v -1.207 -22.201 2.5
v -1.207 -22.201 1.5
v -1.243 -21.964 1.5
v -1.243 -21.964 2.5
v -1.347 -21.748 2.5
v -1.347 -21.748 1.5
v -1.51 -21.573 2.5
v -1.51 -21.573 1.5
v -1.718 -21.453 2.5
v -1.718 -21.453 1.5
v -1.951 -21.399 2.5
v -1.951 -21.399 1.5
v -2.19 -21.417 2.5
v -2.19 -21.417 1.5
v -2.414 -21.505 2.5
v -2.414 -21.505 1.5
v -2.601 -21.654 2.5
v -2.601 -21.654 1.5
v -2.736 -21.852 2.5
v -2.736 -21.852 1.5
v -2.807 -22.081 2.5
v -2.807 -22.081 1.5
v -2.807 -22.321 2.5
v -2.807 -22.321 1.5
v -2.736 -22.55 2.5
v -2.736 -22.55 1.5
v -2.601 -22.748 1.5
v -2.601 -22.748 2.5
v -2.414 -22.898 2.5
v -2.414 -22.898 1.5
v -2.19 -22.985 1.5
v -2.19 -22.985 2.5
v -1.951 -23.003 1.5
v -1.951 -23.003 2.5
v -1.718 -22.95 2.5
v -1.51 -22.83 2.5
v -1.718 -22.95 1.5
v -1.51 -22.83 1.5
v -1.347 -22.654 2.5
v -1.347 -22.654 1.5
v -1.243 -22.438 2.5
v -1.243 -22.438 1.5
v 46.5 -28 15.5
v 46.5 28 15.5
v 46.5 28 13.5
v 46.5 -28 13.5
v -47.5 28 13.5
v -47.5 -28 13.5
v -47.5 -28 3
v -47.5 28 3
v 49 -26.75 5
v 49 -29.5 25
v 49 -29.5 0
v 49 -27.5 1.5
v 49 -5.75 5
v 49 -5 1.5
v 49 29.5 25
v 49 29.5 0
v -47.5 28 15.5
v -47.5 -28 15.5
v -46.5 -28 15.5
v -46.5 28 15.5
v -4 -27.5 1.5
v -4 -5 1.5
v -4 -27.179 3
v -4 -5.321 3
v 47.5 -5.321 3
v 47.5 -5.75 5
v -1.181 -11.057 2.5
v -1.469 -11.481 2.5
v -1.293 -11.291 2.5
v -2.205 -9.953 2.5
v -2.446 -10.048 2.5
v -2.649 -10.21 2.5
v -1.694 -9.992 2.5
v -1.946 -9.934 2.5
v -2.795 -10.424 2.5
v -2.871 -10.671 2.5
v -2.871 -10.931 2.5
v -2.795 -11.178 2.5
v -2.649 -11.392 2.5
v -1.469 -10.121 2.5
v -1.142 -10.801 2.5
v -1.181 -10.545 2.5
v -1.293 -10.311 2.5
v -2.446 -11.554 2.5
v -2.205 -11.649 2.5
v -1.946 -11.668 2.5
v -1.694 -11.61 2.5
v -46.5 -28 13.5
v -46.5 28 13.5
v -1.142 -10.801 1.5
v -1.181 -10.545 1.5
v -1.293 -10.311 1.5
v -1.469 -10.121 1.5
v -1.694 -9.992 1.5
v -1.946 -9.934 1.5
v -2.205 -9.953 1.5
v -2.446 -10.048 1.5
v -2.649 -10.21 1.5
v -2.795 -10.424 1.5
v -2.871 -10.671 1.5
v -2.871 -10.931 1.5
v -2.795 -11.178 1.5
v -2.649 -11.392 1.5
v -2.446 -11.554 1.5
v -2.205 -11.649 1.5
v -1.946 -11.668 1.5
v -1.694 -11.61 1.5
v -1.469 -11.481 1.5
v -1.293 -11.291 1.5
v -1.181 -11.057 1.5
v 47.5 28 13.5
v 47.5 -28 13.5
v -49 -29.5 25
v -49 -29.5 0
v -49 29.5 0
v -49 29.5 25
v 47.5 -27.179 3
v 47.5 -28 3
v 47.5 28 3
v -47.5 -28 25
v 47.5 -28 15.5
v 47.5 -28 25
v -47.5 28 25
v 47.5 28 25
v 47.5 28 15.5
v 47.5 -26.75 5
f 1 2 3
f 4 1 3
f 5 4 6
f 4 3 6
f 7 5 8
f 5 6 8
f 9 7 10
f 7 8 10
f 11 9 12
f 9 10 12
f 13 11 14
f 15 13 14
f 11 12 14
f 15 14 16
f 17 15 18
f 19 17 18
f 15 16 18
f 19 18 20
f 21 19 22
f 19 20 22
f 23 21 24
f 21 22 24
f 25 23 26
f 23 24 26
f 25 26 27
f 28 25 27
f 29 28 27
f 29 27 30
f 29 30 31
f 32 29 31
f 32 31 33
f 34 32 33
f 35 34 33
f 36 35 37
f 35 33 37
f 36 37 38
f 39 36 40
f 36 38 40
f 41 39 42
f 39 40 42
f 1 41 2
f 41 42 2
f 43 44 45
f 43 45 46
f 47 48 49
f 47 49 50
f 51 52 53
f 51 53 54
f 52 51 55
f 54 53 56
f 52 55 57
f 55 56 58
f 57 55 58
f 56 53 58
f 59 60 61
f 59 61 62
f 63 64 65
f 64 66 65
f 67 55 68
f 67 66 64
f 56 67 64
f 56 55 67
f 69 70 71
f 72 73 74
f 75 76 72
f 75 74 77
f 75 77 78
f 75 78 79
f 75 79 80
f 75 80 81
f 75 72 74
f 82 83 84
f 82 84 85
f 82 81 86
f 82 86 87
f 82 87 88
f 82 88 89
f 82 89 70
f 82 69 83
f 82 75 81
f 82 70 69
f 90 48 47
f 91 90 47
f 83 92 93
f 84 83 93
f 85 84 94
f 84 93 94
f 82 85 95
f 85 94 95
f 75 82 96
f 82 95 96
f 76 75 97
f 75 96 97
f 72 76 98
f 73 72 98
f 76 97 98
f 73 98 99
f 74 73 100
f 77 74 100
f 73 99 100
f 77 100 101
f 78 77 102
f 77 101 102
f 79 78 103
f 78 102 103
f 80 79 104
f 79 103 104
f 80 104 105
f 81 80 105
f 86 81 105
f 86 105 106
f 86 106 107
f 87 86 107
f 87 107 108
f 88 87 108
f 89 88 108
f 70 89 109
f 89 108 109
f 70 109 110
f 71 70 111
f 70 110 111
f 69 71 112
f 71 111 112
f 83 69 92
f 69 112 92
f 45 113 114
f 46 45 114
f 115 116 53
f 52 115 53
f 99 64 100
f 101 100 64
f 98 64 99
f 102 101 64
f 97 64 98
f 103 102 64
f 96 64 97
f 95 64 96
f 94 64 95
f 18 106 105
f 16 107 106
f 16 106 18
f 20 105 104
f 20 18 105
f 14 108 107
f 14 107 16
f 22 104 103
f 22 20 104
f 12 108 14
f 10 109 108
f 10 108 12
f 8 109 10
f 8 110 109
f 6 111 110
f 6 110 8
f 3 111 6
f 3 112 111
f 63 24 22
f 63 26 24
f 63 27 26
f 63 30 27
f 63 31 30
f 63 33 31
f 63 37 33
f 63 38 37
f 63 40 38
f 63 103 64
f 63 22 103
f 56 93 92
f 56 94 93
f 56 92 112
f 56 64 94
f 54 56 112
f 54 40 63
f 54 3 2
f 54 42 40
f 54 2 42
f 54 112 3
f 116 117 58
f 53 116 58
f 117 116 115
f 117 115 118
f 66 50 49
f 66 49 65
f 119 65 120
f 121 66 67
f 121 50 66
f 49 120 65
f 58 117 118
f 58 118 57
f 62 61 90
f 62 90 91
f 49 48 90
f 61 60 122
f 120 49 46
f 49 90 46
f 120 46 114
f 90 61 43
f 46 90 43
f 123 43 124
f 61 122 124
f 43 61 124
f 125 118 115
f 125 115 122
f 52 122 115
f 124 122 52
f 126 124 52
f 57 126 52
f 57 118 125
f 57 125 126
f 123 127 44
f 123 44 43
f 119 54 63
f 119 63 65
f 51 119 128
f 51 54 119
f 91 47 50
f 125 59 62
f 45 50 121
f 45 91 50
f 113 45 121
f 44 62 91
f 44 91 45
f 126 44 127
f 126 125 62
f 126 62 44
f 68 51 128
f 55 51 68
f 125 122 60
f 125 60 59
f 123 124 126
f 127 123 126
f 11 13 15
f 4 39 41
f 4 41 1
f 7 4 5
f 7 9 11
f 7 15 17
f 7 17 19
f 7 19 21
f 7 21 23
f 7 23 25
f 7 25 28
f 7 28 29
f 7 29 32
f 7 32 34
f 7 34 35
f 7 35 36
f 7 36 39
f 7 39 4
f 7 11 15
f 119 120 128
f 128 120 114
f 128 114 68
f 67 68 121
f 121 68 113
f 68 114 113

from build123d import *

# Parameters (mm, degrees)
SKETCH010_W     = 98
SKETCH010_H     = 59
PAD007_DEPTH    = 25
SKETCH011_W     = 95
SKETCH011_H     = 56
POCKET002_DEPTH = 22
SKETCH012_W     = 56
SKETCH012_H     = 2
PAD008_DEPTH    = 1
SKETCH013_W     = 56.025157
SKETCH013_H     = 2
PAD009_DEPTH    = 1
POCKET003_DEPTH = 53
SKETCH017_R     = 0.869454
SKETCH017_R_2   = 0.804164
PAD010_DEPTH    = 1


with BuildPart() as part:
    # Sketch010 → Pad007 (new body)
    with BuildSketch(Plane.XY):
        Rectangle(SKETCH010_W, SKETCH010_H)
    extrude(amount=PAD007_DEPTH)

    # Sketch011 (on Face6 of Pad007) → Pocket002 (cut)
    with BuildSketch(Plane.XY.offset(25)):
        Rectangle(SKETCH011_W, SKETCH011_H)
    extrude(amount=-POCKET002_DEPTH, mode=Mode.SUBTRACT)

    # Sketch012 (on Face9 of Pocket002) → Pad008 (join)
    with BuildSketch(Plane.YZ.offset(-47.5)):
        with Locations((0, 14.5)):
            Rectangle(SKETCH012_W, SKETCH012_H)
    extrude(amount=PAD008_DEPTH)

    # Sketch013 (on Face7 of Pad008) → Pad009 (join)
    with BuildSketch(Plane(origin=(47.5, 0, 0), x_dir=(0, -1, 0), z_dir=(-1, 0, 0))):
        with Locations((0.0125785, 14.5)):
            Rectangle(SKETCH013_W, SKETCH013_H)
    extrude(amount=PAD009_DEPTH)

    # Sketch015 (on Face1 of Pad009) → Pocket003 (cut)
    with BuildSketch(Plane.YZ.offset(49)):
        Polygon((-27.5, 1.5), (-26.75, 5), (-5.75, 5), (-5, 1.5), align=None)
    extrude(amount=-POCKET003_DEPTH, mode=Mode.SUBTRACT)

    # Sketch017 (on Face9 of Pocket003) → Pad010 (join)
    with BuildSketch(Plane.XY.offset(1.5)):
        with Locations((-2.011455, -10.80103)):
            Circle(SKETCH017_R)
        with Locations((-2.011455, -22.201292)):
            Circle(SKETCH017_R_2)
    extrude(amount=PAD010_DEPTH)


solid = part.part
